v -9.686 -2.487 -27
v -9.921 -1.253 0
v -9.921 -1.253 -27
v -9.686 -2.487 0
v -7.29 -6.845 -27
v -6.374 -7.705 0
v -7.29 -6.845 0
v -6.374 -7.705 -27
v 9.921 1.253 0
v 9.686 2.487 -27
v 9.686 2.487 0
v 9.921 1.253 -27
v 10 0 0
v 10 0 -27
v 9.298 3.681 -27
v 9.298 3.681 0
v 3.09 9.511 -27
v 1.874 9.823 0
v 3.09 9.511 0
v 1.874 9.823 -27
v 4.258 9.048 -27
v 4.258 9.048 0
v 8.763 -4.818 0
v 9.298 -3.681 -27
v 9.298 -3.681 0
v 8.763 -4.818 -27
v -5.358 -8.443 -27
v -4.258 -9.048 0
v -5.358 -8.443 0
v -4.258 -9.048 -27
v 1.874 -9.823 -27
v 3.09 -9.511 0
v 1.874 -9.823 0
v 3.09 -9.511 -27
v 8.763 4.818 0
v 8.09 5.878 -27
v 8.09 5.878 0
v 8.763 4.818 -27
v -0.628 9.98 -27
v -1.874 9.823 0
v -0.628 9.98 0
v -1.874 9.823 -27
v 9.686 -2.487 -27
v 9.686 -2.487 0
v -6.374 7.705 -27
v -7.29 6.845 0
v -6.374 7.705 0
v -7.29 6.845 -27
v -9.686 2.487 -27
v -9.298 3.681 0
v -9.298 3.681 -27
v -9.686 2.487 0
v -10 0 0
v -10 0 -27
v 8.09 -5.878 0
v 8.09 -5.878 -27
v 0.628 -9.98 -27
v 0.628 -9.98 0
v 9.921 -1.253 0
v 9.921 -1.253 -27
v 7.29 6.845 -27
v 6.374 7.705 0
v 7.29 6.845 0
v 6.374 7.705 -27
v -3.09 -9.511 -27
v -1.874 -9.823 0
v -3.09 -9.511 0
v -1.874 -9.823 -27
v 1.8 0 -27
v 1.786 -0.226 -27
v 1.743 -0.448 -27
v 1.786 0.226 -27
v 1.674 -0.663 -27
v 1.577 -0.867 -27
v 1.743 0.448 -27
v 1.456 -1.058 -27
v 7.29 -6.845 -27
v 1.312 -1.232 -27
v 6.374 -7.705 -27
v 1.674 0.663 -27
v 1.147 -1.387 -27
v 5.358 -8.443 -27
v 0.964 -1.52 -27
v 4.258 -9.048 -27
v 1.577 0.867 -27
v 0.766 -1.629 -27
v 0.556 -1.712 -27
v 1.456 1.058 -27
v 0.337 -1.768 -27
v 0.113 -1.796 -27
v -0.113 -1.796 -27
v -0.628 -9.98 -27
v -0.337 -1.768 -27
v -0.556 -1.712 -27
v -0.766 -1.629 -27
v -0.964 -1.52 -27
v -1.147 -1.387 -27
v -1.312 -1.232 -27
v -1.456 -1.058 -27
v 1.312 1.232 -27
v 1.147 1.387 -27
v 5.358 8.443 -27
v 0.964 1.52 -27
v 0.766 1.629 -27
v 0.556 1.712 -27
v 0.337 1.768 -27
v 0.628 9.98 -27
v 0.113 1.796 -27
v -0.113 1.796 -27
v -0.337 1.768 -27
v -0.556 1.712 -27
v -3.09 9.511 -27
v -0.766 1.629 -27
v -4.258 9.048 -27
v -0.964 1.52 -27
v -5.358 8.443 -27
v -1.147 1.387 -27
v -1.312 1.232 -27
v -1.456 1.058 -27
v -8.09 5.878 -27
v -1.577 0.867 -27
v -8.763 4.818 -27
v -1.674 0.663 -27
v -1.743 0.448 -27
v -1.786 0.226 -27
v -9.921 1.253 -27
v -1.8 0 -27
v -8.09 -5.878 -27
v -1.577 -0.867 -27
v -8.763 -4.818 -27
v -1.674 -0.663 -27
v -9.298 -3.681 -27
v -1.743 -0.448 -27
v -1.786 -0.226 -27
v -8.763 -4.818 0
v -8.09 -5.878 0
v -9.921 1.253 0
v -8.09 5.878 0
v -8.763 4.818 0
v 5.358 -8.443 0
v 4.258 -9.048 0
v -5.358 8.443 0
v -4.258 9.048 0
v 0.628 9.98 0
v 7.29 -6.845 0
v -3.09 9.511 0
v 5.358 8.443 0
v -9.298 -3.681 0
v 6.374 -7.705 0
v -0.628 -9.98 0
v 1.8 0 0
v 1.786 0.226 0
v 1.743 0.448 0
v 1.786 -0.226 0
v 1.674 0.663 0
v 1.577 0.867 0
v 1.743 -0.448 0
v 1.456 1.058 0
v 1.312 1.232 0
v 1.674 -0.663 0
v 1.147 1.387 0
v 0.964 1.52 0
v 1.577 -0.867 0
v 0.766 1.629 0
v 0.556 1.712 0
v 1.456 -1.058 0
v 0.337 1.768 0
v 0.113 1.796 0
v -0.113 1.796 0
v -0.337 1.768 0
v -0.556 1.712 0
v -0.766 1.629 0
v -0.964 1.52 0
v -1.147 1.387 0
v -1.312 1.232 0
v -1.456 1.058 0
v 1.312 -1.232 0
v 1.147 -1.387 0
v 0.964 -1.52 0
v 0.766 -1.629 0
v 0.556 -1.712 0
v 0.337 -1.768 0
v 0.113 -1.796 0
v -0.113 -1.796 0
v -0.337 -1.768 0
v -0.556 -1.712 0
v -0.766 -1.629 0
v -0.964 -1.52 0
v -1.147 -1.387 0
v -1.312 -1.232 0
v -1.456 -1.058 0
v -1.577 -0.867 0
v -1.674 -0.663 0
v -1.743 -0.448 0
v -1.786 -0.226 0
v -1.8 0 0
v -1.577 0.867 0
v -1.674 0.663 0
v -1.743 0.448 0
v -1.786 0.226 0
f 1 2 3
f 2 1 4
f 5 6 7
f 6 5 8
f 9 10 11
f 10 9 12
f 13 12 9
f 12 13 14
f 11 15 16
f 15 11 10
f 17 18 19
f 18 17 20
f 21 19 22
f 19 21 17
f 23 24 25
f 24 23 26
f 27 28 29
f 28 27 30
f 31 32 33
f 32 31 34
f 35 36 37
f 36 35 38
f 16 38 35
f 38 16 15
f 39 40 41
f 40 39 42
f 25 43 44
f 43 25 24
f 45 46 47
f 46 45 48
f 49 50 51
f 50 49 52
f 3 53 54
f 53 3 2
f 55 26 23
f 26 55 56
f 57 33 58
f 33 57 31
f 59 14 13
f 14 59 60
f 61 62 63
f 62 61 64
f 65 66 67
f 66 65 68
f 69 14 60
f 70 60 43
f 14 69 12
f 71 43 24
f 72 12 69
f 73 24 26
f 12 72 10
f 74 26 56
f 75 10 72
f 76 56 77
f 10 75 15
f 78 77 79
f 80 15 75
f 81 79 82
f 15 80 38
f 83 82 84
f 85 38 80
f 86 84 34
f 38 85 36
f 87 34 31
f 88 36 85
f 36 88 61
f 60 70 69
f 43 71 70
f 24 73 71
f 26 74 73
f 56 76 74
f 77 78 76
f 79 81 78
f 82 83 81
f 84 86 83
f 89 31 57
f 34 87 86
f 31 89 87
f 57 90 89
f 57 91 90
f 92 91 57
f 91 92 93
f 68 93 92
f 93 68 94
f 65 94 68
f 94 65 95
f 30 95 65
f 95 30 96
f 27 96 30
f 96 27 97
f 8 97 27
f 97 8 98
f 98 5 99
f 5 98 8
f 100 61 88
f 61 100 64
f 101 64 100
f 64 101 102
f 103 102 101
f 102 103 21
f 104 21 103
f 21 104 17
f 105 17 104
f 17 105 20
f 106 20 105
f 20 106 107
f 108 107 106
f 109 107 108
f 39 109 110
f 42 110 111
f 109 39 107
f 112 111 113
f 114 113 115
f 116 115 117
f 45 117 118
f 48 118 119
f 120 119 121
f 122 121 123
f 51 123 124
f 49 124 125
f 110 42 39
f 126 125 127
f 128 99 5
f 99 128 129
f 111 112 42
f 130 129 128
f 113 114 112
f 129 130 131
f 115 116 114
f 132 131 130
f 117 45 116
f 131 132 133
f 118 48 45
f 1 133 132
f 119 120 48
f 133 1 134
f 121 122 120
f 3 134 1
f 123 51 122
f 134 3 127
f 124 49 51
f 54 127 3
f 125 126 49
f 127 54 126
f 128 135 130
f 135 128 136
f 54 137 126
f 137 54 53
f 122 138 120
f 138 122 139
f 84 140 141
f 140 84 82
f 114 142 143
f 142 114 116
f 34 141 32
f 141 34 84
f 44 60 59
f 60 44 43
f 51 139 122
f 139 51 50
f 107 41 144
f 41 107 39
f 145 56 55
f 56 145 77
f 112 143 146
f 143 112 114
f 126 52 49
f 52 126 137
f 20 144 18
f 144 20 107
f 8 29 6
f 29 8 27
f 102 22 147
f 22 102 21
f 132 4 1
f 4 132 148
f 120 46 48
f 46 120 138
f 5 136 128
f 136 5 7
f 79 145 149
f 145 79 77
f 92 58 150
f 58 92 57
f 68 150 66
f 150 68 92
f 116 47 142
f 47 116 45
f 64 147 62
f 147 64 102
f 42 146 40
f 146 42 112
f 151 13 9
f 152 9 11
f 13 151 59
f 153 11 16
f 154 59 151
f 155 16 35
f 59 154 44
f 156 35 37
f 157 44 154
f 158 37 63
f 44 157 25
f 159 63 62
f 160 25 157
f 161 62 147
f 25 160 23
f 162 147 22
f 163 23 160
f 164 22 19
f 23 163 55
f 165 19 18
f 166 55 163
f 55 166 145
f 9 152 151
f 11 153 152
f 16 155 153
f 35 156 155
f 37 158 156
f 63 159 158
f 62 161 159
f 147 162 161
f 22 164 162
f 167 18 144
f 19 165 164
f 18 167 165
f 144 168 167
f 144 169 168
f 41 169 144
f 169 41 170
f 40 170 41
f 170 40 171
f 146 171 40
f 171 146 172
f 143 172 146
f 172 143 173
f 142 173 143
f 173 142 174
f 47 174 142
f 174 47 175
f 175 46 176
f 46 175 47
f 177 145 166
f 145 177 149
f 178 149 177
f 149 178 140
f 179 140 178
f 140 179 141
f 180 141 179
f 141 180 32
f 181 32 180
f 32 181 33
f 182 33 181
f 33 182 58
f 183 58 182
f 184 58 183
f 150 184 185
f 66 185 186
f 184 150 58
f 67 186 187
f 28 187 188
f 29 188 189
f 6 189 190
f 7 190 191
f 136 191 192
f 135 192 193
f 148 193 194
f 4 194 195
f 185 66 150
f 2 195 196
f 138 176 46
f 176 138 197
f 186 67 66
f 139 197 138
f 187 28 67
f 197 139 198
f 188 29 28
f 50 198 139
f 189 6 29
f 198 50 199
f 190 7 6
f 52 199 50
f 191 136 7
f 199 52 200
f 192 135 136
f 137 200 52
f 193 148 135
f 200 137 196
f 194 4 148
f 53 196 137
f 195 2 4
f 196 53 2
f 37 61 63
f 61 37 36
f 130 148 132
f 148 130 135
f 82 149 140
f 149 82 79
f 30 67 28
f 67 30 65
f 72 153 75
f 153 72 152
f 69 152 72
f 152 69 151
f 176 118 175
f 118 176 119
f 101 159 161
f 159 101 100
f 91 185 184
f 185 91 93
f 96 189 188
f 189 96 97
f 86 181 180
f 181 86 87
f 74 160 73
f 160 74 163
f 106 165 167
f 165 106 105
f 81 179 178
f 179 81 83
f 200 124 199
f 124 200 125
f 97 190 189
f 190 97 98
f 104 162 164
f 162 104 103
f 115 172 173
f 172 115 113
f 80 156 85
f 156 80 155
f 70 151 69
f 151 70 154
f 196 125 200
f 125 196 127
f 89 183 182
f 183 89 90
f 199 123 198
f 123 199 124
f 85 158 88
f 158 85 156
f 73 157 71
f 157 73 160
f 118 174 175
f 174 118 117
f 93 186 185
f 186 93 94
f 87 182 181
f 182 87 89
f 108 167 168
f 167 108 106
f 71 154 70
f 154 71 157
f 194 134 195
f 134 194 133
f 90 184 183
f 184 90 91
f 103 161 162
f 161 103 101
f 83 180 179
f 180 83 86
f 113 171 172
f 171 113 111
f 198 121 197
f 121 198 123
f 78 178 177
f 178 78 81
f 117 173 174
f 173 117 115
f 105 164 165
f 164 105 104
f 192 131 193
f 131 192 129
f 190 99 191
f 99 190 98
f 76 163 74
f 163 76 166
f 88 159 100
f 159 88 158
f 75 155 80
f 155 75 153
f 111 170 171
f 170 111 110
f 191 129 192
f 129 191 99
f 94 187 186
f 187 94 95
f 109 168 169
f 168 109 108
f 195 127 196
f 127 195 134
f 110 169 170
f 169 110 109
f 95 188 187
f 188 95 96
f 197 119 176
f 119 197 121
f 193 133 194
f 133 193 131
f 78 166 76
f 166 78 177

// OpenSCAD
$fn = 50;


difference() {
	union() {
		translate(v = [0, 0, -27.0000000000]) {
			cylinder(h = 27, r = 10.0000000000);
		}
		cylinder(h = 0, r = 13.0000000000);
	}
	union() {
		#translate(v = [0, 0, -27]) {
			cylinder(h = 27, r = 1.8000000000);
		}
	}
}
